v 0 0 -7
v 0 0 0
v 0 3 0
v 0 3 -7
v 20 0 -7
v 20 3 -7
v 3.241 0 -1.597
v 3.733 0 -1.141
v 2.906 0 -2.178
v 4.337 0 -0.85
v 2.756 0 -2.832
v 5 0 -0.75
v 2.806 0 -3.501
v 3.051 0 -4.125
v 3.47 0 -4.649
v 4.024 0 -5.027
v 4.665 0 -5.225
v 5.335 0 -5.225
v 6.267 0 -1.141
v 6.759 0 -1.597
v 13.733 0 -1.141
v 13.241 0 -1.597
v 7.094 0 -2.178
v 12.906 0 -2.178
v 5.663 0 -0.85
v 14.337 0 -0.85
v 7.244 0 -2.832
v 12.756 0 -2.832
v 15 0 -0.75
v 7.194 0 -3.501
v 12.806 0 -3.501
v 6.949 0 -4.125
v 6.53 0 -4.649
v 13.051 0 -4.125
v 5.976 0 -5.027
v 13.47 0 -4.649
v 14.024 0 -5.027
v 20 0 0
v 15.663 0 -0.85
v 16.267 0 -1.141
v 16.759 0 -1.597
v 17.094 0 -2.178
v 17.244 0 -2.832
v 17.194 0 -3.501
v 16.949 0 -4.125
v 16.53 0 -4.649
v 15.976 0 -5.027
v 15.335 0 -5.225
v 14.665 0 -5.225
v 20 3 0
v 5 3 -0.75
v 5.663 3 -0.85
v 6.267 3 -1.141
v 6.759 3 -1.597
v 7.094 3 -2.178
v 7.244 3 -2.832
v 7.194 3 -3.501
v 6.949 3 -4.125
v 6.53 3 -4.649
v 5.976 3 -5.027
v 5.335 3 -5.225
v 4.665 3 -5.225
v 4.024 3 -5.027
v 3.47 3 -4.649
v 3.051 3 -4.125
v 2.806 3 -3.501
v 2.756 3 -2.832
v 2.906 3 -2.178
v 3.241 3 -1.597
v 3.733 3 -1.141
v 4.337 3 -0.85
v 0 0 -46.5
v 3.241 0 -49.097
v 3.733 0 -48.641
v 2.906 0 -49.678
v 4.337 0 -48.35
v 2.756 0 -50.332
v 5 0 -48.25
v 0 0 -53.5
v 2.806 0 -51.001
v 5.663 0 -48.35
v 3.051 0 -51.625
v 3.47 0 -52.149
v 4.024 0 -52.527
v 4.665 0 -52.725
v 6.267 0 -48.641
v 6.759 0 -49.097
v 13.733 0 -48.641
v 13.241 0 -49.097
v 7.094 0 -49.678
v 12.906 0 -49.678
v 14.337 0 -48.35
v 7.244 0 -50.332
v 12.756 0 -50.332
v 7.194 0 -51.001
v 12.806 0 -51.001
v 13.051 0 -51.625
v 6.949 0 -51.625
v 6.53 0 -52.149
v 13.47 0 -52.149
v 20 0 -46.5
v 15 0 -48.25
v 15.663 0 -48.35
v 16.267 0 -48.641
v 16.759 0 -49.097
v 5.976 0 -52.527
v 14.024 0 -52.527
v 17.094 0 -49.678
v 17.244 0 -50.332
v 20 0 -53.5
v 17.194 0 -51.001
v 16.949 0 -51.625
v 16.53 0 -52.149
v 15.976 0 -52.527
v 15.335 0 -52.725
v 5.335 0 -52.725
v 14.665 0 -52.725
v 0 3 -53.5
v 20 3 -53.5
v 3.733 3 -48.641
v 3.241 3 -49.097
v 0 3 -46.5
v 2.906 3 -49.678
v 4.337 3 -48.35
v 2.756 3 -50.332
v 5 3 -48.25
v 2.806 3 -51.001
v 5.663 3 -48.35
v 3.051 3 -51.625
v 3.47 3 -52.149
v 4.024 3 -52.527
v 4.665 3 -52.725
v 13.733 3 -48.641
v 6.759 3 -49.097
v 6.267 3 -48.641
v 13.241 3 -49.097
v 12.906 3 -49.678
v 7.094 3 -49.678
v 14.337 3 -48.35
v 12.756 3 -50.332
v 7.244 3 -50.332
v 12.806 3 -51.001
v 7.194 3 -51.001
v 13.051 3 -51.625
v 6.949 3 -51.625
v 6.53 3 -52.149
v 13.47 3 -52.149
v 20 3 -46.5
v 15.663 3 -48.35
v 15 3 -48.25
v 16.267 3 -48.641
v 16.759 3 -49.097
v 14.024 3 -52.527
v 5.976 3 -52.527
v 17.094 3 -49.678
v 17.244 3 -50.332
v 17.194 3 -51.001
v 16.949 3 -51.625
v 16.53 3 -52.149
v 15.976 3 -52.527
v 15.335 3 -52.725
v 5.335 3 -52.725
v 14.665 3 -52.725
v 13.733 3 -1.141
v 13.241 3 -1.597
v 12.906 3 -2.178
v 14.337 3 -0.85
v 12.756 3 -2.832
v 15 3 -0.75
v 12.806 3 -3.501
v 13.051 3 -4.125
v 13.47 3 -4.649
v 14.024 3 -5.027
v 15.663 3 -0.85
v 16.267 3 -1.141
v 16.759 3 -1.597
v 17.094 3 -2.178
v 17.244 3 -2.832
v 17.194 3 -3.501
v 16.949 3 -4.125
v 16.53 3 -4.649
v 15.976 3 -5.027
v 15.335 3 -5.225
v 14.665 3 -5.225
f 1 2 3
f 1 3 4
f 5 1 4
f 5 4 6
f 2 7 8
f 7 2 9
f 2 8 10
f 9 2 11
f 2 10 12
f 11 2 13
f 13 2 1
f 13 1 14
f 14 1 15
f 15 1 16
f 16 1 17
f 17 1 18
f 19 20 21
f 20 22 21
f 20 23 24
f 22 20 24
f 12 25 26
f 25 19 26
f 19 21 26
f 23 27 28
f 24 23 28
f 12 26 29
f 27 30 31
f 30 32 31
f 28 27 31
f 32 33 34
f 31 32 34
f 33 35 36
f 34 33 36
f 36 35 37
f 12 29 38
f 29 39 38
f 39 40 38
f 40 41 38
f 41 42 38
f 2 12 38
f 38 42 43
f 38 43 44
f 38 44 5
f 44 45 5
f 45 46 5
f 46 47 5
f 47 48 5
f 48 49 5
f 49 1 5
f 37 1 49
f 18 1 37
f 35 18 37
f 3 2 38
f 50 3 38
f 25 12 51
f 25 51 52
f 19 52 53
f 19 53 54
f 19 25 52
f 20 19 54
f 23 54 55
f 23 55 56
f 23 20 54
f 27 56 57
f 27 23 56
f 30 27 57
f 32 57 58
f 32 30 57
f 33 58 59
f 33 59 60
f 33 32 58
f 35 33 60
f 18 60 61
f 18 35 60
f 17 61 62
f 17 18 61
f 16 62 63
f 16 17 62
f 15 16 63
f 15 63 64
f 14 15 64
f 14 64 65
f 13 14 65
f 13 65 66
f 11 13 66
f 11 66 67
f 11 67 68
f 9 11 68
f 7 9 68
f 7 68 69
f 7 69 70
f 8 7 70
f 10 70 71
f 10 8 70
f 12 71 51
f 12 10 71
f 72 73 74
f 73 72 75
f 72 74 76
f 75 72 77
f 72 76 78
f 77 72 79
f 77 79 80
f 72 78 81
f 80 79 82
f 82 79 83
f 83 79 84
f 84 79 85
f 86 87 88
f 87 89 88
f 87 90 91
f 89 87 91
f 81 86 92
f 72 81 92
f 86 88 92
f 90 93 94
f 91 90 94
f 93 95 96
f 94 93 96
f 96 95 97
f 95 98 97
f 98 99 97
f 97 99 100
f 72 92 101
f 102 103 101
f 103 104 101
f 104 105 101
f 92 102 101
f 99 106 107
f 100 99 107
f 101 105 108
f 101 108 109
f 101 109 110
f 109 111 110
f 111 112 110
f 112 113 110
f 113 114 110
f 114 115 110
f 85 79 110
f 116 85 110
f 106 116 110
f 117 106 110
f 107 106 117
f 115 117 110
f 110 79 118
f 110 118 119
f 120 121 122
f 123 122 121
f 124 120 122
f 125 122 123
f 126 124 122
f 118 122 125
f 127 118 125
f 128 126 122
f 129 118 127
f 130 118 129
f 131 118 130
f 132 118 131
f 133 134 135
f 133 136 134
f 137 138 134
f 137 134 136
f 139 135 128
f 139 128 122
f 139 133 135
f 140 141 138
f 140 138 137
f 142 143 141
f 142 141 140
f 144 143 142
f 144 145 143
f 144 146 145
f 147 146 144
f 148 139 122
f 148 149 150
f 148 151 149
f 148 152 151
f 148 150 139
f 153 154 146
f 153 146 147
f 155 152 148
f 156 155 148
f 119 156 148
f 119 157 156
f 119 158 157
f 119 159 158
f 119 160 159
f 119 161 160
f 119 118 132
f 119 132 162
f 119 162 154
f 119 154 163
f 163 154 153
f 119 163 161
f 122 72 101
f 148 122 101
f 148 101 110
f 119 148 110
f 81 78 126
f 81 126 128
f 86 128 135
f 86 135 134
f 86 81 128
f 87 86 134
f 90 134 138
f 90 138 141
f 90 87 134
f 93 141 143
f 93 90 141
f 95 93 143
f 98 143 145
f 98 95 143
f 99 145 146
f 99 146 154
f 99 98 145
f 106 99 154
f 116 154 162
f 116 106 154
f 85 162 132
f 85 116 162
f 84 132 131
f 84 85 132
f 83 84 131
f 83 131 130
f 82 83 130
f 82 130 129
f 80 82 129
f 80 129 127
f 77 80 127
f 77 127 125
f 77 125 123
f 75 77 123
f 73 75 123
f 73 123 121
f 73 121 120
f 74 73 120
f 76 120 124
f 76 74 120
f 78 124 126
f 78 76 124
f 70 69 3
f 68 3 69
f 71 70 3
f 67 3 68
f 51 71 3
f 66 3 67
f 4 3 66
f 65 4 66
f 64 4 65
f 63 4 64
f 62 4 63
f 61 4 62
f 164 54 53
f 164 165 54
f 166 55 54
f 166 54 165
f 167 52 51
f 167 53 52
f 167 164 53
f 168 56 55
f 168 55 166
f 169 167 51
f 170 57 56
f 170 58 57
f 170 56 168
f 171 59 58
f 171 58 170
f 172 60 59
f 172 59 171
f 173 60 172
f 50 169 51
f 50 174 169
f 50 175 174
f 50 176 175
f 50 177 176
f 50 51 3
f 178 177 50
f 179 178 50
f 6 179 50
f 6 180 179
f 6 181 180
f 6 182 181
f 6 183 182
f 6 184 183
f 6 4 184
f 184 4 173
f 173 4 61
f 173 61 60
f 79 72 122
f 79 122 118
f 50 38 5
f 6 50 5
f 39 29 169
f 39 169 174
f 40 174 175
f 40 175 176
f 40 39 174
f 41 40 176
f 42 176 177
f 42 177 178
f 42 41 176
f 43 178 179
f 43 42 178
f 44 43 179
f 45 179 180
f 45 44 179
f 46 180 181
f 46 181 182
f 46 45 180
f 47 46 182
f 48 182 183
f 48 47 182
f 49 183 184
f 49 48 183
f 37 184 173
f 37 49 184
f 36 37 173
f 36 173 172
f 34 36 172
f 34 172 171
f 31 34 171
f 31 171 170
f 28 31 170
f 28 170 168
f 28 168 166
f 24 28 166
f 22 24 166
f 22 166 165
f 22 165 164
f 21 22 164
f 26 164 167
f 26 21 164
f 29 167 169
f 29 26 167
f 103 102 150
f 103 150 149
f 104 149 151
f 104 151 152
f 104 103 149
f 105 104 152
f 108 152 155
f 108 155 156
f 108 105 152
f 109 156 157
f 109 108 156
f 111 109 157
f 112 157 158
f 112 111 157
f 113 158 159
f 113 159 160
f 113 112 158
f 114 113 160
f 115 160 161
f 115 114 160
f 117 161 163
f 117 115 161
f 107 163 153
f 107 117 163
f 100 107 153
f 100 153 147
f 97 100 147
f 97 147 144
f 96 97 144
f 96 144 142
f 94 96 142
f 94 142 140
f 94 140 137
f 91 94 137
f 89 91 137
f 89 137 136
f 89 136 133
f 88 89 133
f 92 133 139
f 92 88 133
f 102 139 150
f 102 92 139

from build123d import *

# Parameters (mm, degrees)
SKETCH1_W             = 20
SKETCH1_H             = 7
SKETCH1_R             = 2.25
BOSS_EXTRUDE2_DEPTH   = 3
BOSS_EXTRUDE2_2_DEPTH = 3


with BuildPart() as part:
    # Sketch1 → Boss-Extrude2 (new body)
    with BuildSketch(Plane(origin=(0, 0, 0), x_dir=(1, 0, 0), z_dir=(0, 1, 0))):
        with Locations((10, 50)):
            Rectangle(SKETCH1_W, SKETCH1_H)
        with Locations(Location((5, 50.5, 0), (0, 0, 270))):
            Circle(SKETCH1_R, mode=Mode.SUBTRACT)
        with Locations(Location((15, 50.5, 0), (0, 0, 270))):
            Circle(SKETCH1_R, mode=Mode.SUBTRACT)
    extrude(amount=BOSS_EXTRUDE2_DEPTH)


with BuildPart() as body_2:
    # Sketch1 → Boss-Extrude2 2 (new body)
    with BuildSketch(Plane(origin=(0, 0, 0), x_dir=(1, 0, 0), z_dir=(0, 1, 0))):
        with Locations((10, 3.5)):
            Rectangle(SKETCH1_W, SKETCH1_H)
        with Locations(Location((5, 3, 0), (0, 0, 270))):
            Circle(SKETCH1_R, mode=Mode.SUBTRACT)
        with Locations(Location((15, 3, 0), (0, 0, 270))):
            Circle(SKETCH1_R, mode=Mode.SUBTRACT)
    extrude(amount=BOSS_EXTRUDE2_2_DEPTH)


solid = Compound([part.part, body_2.part])
